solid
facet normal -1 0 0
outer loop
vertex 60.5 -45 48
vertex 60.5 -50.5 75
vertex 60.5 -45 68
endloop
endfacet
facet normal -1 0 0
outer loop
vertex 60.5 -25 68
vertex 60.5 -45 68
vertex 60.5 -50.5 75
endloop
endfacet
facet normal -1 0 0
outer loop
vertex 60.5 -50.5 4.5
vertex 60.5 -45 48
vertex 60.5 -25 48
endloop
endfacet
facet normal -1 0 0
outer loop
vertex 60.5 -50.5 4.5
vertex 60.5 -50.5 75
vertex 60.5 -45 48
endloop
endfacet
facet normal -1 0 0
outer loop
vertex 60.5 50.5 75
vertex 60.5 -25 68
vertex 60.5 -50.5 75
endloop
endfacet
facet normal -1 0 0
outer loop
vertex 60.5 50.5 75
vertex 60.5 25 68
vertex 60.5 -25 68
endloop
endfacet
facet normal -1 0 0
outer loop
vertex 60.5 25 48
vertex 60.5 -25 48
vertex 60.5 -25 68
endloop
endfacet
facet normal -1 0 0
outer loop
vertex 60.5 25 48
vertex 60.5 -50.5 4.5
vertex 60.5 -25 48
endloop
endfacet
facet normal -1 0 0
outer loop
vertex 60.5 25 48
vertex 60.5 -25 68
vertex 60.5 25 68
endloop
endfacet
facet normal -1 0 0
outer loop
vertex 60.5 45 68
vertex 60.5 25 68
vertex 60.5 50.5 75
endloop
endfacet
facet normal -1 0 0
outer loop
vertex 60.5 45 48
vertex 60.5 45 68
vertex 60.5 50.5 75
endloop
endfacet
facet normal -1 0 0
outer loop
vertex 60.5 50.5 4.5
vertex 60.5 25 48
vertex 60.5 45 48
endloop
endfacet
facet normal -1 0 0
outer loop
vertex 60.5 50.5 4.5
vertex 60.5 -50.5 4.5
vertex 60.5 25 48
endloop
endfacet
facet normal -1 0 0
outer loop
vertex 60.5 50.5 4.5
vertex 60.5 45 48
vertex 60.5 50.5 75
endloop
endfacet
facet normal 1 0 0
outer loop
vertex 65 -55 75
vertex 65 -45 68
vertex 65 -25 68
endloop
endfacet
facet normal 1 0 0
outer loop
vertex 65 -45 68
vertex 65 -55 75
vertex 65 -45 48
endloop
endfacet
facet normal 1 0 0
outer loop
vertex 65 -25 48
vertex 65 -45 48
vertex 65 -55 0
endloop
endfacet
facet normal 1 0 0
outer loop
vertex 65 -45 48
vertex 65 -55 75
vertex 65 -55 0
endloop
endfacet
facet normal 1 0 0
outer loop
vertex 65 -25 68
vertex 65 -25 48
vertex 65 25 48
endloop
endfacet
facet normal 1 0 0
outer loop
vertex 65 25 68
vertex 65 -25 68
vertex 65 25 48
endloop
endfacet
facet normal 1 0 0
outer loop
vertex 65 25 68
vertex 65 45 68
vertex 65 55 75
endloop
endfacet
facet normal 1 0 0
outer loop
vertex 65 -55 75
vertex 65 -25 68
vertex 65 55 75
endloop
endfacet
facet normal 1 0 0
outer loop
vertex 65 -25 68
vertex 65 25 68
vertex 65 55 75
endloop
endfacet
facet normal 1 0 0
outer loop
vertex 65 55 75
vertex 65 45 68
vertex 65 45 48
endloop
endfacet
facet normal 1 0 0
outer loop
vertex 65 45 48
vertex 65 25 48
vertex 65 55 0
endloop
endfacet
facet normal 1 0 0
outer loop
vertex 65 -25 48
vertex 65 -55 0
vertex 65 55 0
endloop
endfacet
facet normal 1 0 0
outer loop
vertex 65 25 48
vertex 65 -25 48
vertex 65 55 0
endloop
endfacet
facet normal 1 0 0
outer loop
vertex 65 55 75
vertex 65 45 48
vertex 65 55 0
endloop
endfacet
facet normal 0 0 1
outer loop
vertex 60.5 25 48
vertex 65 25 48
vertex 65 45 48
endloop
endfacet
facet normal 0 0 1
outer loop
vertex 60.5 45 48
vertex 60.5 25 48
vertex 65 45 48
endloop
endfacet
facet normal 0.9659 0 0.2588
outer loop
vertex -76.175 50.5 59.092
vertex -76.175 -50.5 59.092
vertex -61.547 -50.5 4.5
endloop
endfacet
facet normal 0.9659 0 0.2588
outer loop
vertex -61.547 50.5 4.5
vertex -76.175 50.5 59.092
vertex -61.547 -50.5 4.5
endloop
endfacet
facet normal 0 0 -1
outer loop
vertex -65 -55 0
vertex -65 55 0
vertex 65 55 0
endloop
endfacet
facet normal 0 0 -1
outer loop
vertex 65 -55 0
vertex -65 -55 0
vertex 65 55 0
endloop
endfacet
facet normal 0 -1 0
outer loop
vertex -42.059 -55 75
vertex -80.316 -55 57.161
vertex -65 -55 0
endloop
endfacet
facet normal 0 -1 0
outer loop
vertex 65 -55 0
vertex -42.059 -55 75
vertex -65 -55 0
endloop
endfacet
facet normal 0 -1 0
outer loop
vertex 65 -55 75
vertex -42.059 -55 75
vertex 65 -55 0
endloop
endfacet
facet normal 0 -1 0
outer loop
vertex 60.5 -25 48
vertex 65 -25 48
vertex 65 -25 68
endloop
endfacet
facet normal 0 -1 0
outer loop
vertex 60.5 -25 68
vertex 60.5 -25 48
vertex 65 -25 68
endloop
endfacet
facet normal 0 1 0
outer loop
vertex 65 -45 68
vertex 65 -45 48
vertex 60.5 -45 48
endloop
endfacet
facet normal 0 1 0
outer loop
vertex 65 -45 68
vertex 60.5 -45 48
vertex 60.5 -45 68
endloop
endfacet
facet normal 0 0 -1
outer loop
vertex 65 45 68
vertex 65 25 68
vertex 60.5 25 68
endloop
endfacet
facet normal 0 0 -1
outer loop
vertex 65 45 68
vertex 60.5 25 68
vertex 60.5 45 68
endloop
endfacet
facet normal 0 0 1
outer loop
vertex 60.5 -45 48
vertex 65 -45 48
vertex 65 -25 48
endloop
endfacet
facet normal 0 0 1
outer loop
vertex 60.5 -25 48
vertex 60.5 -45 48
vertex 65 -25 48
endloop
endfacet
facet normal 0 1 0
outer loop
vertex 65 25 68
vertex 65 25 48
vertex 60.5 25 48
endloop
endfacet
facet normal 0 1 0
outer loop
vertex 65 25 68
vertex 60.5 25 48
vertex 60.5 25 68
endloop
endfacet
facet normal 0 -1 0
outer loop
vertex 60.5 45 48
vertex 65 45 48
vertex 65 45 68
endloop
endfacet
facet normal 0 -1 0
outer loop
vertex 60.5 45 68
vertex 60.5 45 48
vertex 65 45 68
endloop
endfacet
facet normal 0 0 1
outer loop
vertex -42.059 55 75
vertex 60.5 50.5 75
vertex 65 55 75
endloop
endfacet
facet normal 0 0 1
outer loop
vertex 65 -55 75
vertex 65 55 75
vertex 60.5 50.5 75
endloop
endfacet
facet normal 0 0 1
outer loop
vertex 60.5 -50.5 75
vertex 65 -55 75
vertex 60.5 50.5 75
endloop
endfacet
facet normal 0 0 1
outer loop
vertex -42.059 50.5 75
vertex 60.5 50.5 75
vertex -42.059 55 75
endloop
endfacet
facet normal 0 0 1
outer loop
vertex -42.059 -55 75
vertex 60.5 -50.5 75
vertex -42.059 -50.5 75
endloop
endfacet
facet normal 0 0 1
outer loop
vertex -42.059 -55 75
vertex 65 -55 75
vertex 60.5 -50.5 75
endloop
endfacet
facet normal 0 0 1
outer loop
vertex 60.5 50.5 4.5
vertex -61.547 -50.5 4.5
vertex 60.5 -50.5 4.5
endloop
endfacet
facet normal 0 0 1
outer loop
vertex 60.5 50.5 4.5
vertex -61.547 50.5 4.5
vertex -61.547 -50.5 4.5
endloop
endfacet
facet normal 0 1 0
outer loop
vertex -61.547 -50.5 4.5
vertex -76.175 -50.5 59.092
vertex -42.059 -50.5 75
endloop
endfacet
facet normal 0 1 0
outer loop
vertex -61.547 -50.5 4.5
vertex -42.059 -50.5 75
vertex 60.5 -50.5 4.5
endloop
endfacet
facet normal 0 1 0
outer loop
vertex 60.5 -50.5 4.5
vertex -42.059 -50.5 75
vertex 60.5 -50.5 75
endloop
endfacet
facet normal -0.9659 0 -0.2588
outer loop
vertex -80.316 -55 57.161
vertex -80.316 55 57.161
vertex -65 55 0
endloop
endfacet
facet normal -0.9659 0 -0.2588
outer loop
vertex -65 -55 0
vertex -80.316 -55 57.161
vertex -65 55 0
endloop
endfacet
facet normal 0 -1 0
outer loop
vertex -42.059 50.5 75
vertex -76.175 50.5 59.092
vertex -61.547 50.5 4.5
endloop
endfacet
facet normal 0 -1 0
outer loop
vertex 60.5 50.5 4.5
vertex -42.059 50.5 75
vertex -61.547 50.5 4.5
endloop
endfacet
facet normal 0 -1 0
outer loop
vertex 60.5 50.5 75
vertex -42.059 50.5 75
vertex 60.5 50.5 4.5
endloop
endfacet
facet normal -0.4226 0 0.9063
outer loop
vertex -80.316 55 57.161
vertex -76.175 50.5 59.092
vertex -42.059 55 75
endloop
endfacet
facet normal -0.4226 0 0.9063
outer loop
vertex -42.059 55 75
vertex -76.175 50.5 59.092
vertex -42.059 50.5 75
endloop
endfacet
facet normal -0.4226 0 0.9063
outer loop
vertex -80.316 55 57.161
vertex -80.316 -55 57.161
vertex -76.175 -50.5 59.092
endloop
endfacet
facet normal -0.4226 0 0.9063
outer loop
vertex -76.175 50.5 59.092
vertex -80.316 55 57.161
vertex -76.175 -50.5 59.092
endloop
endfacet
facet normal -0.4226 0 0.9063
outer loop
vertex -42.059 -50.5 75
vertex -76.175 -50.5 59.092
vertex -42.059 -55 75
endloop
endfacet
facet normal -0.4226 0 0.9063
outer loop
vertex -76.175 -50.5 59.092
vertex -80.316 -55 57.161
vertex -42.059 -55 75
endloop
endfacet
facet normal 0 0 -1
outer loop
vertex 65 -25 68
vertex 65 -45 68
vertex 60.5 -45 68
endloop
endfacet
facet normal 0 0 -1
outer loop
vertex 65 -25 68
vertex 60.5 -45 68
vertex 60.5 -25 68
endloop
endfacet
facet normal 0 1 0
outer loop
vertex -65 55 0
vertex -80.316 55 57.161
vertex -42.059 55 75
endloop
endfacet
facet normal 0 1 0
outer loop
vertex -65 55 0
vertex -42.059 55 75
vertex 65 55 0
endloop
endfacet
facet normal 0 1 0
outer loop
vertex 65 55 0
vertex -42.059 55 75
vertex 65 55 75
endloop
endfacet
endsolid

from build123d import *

# Parameters (mm, degrees)
F0_W     = 130
F0_H     = 110
F1_DEPTH = 75
F3_DEPTH = 110
F4_T     = -4.5
F6_DEPTH = 110.001
F7_W     = 20
F7_H     = 20
F8_DEPTH = 4.5


with BuildPart() as f1:
    # F0 (on Top) → F1 (new body)
    with BuildSketch(Plane.XY):
        Rectangle(F0_W, F0_H)
    extrude(amount=F1_DEPTH)

    # F2 (on face) → F3 (join, through all)
    with BuildSketch(Plane.XZ.offset(55)):
        Polygon((-85.096189, 75), (-65, 0), (-65, 75), align=None)
    extrude(amount=-F3_DEPTH)

    # F4
    f4_openings = [f1.faces().sort_by_distance(p)[0] for p in [
        (-10.048095, 0, 75),
    ]]
    offset(amount=F4_T, openings=f4_openings)

    # F5 (on face) → F6 (cut, through all)
    with BuildSketch(Plane.XZ.offset(55)):
        Polygon((-80.316136, 57.160596), (-42.05941, 75), (-85.419632, 75), align=None)
    extrude(amount=-F6_DEPTH, mode=Mode.SUBTRACT)

    # F7 (on face) → F8 (cut, through all)
    with BuildSketch(Plane.YZ.offset(65)):
        with Locations((-35, 58)):
            Rectangle(F7_W, F7_H)
        with Locations((35, 58)):
            Rectangle(F7_W, F7_H)
    extrude(amount=-F8_DEPTH, mode=Mode.SUBTRACT)


solid = f1.part
